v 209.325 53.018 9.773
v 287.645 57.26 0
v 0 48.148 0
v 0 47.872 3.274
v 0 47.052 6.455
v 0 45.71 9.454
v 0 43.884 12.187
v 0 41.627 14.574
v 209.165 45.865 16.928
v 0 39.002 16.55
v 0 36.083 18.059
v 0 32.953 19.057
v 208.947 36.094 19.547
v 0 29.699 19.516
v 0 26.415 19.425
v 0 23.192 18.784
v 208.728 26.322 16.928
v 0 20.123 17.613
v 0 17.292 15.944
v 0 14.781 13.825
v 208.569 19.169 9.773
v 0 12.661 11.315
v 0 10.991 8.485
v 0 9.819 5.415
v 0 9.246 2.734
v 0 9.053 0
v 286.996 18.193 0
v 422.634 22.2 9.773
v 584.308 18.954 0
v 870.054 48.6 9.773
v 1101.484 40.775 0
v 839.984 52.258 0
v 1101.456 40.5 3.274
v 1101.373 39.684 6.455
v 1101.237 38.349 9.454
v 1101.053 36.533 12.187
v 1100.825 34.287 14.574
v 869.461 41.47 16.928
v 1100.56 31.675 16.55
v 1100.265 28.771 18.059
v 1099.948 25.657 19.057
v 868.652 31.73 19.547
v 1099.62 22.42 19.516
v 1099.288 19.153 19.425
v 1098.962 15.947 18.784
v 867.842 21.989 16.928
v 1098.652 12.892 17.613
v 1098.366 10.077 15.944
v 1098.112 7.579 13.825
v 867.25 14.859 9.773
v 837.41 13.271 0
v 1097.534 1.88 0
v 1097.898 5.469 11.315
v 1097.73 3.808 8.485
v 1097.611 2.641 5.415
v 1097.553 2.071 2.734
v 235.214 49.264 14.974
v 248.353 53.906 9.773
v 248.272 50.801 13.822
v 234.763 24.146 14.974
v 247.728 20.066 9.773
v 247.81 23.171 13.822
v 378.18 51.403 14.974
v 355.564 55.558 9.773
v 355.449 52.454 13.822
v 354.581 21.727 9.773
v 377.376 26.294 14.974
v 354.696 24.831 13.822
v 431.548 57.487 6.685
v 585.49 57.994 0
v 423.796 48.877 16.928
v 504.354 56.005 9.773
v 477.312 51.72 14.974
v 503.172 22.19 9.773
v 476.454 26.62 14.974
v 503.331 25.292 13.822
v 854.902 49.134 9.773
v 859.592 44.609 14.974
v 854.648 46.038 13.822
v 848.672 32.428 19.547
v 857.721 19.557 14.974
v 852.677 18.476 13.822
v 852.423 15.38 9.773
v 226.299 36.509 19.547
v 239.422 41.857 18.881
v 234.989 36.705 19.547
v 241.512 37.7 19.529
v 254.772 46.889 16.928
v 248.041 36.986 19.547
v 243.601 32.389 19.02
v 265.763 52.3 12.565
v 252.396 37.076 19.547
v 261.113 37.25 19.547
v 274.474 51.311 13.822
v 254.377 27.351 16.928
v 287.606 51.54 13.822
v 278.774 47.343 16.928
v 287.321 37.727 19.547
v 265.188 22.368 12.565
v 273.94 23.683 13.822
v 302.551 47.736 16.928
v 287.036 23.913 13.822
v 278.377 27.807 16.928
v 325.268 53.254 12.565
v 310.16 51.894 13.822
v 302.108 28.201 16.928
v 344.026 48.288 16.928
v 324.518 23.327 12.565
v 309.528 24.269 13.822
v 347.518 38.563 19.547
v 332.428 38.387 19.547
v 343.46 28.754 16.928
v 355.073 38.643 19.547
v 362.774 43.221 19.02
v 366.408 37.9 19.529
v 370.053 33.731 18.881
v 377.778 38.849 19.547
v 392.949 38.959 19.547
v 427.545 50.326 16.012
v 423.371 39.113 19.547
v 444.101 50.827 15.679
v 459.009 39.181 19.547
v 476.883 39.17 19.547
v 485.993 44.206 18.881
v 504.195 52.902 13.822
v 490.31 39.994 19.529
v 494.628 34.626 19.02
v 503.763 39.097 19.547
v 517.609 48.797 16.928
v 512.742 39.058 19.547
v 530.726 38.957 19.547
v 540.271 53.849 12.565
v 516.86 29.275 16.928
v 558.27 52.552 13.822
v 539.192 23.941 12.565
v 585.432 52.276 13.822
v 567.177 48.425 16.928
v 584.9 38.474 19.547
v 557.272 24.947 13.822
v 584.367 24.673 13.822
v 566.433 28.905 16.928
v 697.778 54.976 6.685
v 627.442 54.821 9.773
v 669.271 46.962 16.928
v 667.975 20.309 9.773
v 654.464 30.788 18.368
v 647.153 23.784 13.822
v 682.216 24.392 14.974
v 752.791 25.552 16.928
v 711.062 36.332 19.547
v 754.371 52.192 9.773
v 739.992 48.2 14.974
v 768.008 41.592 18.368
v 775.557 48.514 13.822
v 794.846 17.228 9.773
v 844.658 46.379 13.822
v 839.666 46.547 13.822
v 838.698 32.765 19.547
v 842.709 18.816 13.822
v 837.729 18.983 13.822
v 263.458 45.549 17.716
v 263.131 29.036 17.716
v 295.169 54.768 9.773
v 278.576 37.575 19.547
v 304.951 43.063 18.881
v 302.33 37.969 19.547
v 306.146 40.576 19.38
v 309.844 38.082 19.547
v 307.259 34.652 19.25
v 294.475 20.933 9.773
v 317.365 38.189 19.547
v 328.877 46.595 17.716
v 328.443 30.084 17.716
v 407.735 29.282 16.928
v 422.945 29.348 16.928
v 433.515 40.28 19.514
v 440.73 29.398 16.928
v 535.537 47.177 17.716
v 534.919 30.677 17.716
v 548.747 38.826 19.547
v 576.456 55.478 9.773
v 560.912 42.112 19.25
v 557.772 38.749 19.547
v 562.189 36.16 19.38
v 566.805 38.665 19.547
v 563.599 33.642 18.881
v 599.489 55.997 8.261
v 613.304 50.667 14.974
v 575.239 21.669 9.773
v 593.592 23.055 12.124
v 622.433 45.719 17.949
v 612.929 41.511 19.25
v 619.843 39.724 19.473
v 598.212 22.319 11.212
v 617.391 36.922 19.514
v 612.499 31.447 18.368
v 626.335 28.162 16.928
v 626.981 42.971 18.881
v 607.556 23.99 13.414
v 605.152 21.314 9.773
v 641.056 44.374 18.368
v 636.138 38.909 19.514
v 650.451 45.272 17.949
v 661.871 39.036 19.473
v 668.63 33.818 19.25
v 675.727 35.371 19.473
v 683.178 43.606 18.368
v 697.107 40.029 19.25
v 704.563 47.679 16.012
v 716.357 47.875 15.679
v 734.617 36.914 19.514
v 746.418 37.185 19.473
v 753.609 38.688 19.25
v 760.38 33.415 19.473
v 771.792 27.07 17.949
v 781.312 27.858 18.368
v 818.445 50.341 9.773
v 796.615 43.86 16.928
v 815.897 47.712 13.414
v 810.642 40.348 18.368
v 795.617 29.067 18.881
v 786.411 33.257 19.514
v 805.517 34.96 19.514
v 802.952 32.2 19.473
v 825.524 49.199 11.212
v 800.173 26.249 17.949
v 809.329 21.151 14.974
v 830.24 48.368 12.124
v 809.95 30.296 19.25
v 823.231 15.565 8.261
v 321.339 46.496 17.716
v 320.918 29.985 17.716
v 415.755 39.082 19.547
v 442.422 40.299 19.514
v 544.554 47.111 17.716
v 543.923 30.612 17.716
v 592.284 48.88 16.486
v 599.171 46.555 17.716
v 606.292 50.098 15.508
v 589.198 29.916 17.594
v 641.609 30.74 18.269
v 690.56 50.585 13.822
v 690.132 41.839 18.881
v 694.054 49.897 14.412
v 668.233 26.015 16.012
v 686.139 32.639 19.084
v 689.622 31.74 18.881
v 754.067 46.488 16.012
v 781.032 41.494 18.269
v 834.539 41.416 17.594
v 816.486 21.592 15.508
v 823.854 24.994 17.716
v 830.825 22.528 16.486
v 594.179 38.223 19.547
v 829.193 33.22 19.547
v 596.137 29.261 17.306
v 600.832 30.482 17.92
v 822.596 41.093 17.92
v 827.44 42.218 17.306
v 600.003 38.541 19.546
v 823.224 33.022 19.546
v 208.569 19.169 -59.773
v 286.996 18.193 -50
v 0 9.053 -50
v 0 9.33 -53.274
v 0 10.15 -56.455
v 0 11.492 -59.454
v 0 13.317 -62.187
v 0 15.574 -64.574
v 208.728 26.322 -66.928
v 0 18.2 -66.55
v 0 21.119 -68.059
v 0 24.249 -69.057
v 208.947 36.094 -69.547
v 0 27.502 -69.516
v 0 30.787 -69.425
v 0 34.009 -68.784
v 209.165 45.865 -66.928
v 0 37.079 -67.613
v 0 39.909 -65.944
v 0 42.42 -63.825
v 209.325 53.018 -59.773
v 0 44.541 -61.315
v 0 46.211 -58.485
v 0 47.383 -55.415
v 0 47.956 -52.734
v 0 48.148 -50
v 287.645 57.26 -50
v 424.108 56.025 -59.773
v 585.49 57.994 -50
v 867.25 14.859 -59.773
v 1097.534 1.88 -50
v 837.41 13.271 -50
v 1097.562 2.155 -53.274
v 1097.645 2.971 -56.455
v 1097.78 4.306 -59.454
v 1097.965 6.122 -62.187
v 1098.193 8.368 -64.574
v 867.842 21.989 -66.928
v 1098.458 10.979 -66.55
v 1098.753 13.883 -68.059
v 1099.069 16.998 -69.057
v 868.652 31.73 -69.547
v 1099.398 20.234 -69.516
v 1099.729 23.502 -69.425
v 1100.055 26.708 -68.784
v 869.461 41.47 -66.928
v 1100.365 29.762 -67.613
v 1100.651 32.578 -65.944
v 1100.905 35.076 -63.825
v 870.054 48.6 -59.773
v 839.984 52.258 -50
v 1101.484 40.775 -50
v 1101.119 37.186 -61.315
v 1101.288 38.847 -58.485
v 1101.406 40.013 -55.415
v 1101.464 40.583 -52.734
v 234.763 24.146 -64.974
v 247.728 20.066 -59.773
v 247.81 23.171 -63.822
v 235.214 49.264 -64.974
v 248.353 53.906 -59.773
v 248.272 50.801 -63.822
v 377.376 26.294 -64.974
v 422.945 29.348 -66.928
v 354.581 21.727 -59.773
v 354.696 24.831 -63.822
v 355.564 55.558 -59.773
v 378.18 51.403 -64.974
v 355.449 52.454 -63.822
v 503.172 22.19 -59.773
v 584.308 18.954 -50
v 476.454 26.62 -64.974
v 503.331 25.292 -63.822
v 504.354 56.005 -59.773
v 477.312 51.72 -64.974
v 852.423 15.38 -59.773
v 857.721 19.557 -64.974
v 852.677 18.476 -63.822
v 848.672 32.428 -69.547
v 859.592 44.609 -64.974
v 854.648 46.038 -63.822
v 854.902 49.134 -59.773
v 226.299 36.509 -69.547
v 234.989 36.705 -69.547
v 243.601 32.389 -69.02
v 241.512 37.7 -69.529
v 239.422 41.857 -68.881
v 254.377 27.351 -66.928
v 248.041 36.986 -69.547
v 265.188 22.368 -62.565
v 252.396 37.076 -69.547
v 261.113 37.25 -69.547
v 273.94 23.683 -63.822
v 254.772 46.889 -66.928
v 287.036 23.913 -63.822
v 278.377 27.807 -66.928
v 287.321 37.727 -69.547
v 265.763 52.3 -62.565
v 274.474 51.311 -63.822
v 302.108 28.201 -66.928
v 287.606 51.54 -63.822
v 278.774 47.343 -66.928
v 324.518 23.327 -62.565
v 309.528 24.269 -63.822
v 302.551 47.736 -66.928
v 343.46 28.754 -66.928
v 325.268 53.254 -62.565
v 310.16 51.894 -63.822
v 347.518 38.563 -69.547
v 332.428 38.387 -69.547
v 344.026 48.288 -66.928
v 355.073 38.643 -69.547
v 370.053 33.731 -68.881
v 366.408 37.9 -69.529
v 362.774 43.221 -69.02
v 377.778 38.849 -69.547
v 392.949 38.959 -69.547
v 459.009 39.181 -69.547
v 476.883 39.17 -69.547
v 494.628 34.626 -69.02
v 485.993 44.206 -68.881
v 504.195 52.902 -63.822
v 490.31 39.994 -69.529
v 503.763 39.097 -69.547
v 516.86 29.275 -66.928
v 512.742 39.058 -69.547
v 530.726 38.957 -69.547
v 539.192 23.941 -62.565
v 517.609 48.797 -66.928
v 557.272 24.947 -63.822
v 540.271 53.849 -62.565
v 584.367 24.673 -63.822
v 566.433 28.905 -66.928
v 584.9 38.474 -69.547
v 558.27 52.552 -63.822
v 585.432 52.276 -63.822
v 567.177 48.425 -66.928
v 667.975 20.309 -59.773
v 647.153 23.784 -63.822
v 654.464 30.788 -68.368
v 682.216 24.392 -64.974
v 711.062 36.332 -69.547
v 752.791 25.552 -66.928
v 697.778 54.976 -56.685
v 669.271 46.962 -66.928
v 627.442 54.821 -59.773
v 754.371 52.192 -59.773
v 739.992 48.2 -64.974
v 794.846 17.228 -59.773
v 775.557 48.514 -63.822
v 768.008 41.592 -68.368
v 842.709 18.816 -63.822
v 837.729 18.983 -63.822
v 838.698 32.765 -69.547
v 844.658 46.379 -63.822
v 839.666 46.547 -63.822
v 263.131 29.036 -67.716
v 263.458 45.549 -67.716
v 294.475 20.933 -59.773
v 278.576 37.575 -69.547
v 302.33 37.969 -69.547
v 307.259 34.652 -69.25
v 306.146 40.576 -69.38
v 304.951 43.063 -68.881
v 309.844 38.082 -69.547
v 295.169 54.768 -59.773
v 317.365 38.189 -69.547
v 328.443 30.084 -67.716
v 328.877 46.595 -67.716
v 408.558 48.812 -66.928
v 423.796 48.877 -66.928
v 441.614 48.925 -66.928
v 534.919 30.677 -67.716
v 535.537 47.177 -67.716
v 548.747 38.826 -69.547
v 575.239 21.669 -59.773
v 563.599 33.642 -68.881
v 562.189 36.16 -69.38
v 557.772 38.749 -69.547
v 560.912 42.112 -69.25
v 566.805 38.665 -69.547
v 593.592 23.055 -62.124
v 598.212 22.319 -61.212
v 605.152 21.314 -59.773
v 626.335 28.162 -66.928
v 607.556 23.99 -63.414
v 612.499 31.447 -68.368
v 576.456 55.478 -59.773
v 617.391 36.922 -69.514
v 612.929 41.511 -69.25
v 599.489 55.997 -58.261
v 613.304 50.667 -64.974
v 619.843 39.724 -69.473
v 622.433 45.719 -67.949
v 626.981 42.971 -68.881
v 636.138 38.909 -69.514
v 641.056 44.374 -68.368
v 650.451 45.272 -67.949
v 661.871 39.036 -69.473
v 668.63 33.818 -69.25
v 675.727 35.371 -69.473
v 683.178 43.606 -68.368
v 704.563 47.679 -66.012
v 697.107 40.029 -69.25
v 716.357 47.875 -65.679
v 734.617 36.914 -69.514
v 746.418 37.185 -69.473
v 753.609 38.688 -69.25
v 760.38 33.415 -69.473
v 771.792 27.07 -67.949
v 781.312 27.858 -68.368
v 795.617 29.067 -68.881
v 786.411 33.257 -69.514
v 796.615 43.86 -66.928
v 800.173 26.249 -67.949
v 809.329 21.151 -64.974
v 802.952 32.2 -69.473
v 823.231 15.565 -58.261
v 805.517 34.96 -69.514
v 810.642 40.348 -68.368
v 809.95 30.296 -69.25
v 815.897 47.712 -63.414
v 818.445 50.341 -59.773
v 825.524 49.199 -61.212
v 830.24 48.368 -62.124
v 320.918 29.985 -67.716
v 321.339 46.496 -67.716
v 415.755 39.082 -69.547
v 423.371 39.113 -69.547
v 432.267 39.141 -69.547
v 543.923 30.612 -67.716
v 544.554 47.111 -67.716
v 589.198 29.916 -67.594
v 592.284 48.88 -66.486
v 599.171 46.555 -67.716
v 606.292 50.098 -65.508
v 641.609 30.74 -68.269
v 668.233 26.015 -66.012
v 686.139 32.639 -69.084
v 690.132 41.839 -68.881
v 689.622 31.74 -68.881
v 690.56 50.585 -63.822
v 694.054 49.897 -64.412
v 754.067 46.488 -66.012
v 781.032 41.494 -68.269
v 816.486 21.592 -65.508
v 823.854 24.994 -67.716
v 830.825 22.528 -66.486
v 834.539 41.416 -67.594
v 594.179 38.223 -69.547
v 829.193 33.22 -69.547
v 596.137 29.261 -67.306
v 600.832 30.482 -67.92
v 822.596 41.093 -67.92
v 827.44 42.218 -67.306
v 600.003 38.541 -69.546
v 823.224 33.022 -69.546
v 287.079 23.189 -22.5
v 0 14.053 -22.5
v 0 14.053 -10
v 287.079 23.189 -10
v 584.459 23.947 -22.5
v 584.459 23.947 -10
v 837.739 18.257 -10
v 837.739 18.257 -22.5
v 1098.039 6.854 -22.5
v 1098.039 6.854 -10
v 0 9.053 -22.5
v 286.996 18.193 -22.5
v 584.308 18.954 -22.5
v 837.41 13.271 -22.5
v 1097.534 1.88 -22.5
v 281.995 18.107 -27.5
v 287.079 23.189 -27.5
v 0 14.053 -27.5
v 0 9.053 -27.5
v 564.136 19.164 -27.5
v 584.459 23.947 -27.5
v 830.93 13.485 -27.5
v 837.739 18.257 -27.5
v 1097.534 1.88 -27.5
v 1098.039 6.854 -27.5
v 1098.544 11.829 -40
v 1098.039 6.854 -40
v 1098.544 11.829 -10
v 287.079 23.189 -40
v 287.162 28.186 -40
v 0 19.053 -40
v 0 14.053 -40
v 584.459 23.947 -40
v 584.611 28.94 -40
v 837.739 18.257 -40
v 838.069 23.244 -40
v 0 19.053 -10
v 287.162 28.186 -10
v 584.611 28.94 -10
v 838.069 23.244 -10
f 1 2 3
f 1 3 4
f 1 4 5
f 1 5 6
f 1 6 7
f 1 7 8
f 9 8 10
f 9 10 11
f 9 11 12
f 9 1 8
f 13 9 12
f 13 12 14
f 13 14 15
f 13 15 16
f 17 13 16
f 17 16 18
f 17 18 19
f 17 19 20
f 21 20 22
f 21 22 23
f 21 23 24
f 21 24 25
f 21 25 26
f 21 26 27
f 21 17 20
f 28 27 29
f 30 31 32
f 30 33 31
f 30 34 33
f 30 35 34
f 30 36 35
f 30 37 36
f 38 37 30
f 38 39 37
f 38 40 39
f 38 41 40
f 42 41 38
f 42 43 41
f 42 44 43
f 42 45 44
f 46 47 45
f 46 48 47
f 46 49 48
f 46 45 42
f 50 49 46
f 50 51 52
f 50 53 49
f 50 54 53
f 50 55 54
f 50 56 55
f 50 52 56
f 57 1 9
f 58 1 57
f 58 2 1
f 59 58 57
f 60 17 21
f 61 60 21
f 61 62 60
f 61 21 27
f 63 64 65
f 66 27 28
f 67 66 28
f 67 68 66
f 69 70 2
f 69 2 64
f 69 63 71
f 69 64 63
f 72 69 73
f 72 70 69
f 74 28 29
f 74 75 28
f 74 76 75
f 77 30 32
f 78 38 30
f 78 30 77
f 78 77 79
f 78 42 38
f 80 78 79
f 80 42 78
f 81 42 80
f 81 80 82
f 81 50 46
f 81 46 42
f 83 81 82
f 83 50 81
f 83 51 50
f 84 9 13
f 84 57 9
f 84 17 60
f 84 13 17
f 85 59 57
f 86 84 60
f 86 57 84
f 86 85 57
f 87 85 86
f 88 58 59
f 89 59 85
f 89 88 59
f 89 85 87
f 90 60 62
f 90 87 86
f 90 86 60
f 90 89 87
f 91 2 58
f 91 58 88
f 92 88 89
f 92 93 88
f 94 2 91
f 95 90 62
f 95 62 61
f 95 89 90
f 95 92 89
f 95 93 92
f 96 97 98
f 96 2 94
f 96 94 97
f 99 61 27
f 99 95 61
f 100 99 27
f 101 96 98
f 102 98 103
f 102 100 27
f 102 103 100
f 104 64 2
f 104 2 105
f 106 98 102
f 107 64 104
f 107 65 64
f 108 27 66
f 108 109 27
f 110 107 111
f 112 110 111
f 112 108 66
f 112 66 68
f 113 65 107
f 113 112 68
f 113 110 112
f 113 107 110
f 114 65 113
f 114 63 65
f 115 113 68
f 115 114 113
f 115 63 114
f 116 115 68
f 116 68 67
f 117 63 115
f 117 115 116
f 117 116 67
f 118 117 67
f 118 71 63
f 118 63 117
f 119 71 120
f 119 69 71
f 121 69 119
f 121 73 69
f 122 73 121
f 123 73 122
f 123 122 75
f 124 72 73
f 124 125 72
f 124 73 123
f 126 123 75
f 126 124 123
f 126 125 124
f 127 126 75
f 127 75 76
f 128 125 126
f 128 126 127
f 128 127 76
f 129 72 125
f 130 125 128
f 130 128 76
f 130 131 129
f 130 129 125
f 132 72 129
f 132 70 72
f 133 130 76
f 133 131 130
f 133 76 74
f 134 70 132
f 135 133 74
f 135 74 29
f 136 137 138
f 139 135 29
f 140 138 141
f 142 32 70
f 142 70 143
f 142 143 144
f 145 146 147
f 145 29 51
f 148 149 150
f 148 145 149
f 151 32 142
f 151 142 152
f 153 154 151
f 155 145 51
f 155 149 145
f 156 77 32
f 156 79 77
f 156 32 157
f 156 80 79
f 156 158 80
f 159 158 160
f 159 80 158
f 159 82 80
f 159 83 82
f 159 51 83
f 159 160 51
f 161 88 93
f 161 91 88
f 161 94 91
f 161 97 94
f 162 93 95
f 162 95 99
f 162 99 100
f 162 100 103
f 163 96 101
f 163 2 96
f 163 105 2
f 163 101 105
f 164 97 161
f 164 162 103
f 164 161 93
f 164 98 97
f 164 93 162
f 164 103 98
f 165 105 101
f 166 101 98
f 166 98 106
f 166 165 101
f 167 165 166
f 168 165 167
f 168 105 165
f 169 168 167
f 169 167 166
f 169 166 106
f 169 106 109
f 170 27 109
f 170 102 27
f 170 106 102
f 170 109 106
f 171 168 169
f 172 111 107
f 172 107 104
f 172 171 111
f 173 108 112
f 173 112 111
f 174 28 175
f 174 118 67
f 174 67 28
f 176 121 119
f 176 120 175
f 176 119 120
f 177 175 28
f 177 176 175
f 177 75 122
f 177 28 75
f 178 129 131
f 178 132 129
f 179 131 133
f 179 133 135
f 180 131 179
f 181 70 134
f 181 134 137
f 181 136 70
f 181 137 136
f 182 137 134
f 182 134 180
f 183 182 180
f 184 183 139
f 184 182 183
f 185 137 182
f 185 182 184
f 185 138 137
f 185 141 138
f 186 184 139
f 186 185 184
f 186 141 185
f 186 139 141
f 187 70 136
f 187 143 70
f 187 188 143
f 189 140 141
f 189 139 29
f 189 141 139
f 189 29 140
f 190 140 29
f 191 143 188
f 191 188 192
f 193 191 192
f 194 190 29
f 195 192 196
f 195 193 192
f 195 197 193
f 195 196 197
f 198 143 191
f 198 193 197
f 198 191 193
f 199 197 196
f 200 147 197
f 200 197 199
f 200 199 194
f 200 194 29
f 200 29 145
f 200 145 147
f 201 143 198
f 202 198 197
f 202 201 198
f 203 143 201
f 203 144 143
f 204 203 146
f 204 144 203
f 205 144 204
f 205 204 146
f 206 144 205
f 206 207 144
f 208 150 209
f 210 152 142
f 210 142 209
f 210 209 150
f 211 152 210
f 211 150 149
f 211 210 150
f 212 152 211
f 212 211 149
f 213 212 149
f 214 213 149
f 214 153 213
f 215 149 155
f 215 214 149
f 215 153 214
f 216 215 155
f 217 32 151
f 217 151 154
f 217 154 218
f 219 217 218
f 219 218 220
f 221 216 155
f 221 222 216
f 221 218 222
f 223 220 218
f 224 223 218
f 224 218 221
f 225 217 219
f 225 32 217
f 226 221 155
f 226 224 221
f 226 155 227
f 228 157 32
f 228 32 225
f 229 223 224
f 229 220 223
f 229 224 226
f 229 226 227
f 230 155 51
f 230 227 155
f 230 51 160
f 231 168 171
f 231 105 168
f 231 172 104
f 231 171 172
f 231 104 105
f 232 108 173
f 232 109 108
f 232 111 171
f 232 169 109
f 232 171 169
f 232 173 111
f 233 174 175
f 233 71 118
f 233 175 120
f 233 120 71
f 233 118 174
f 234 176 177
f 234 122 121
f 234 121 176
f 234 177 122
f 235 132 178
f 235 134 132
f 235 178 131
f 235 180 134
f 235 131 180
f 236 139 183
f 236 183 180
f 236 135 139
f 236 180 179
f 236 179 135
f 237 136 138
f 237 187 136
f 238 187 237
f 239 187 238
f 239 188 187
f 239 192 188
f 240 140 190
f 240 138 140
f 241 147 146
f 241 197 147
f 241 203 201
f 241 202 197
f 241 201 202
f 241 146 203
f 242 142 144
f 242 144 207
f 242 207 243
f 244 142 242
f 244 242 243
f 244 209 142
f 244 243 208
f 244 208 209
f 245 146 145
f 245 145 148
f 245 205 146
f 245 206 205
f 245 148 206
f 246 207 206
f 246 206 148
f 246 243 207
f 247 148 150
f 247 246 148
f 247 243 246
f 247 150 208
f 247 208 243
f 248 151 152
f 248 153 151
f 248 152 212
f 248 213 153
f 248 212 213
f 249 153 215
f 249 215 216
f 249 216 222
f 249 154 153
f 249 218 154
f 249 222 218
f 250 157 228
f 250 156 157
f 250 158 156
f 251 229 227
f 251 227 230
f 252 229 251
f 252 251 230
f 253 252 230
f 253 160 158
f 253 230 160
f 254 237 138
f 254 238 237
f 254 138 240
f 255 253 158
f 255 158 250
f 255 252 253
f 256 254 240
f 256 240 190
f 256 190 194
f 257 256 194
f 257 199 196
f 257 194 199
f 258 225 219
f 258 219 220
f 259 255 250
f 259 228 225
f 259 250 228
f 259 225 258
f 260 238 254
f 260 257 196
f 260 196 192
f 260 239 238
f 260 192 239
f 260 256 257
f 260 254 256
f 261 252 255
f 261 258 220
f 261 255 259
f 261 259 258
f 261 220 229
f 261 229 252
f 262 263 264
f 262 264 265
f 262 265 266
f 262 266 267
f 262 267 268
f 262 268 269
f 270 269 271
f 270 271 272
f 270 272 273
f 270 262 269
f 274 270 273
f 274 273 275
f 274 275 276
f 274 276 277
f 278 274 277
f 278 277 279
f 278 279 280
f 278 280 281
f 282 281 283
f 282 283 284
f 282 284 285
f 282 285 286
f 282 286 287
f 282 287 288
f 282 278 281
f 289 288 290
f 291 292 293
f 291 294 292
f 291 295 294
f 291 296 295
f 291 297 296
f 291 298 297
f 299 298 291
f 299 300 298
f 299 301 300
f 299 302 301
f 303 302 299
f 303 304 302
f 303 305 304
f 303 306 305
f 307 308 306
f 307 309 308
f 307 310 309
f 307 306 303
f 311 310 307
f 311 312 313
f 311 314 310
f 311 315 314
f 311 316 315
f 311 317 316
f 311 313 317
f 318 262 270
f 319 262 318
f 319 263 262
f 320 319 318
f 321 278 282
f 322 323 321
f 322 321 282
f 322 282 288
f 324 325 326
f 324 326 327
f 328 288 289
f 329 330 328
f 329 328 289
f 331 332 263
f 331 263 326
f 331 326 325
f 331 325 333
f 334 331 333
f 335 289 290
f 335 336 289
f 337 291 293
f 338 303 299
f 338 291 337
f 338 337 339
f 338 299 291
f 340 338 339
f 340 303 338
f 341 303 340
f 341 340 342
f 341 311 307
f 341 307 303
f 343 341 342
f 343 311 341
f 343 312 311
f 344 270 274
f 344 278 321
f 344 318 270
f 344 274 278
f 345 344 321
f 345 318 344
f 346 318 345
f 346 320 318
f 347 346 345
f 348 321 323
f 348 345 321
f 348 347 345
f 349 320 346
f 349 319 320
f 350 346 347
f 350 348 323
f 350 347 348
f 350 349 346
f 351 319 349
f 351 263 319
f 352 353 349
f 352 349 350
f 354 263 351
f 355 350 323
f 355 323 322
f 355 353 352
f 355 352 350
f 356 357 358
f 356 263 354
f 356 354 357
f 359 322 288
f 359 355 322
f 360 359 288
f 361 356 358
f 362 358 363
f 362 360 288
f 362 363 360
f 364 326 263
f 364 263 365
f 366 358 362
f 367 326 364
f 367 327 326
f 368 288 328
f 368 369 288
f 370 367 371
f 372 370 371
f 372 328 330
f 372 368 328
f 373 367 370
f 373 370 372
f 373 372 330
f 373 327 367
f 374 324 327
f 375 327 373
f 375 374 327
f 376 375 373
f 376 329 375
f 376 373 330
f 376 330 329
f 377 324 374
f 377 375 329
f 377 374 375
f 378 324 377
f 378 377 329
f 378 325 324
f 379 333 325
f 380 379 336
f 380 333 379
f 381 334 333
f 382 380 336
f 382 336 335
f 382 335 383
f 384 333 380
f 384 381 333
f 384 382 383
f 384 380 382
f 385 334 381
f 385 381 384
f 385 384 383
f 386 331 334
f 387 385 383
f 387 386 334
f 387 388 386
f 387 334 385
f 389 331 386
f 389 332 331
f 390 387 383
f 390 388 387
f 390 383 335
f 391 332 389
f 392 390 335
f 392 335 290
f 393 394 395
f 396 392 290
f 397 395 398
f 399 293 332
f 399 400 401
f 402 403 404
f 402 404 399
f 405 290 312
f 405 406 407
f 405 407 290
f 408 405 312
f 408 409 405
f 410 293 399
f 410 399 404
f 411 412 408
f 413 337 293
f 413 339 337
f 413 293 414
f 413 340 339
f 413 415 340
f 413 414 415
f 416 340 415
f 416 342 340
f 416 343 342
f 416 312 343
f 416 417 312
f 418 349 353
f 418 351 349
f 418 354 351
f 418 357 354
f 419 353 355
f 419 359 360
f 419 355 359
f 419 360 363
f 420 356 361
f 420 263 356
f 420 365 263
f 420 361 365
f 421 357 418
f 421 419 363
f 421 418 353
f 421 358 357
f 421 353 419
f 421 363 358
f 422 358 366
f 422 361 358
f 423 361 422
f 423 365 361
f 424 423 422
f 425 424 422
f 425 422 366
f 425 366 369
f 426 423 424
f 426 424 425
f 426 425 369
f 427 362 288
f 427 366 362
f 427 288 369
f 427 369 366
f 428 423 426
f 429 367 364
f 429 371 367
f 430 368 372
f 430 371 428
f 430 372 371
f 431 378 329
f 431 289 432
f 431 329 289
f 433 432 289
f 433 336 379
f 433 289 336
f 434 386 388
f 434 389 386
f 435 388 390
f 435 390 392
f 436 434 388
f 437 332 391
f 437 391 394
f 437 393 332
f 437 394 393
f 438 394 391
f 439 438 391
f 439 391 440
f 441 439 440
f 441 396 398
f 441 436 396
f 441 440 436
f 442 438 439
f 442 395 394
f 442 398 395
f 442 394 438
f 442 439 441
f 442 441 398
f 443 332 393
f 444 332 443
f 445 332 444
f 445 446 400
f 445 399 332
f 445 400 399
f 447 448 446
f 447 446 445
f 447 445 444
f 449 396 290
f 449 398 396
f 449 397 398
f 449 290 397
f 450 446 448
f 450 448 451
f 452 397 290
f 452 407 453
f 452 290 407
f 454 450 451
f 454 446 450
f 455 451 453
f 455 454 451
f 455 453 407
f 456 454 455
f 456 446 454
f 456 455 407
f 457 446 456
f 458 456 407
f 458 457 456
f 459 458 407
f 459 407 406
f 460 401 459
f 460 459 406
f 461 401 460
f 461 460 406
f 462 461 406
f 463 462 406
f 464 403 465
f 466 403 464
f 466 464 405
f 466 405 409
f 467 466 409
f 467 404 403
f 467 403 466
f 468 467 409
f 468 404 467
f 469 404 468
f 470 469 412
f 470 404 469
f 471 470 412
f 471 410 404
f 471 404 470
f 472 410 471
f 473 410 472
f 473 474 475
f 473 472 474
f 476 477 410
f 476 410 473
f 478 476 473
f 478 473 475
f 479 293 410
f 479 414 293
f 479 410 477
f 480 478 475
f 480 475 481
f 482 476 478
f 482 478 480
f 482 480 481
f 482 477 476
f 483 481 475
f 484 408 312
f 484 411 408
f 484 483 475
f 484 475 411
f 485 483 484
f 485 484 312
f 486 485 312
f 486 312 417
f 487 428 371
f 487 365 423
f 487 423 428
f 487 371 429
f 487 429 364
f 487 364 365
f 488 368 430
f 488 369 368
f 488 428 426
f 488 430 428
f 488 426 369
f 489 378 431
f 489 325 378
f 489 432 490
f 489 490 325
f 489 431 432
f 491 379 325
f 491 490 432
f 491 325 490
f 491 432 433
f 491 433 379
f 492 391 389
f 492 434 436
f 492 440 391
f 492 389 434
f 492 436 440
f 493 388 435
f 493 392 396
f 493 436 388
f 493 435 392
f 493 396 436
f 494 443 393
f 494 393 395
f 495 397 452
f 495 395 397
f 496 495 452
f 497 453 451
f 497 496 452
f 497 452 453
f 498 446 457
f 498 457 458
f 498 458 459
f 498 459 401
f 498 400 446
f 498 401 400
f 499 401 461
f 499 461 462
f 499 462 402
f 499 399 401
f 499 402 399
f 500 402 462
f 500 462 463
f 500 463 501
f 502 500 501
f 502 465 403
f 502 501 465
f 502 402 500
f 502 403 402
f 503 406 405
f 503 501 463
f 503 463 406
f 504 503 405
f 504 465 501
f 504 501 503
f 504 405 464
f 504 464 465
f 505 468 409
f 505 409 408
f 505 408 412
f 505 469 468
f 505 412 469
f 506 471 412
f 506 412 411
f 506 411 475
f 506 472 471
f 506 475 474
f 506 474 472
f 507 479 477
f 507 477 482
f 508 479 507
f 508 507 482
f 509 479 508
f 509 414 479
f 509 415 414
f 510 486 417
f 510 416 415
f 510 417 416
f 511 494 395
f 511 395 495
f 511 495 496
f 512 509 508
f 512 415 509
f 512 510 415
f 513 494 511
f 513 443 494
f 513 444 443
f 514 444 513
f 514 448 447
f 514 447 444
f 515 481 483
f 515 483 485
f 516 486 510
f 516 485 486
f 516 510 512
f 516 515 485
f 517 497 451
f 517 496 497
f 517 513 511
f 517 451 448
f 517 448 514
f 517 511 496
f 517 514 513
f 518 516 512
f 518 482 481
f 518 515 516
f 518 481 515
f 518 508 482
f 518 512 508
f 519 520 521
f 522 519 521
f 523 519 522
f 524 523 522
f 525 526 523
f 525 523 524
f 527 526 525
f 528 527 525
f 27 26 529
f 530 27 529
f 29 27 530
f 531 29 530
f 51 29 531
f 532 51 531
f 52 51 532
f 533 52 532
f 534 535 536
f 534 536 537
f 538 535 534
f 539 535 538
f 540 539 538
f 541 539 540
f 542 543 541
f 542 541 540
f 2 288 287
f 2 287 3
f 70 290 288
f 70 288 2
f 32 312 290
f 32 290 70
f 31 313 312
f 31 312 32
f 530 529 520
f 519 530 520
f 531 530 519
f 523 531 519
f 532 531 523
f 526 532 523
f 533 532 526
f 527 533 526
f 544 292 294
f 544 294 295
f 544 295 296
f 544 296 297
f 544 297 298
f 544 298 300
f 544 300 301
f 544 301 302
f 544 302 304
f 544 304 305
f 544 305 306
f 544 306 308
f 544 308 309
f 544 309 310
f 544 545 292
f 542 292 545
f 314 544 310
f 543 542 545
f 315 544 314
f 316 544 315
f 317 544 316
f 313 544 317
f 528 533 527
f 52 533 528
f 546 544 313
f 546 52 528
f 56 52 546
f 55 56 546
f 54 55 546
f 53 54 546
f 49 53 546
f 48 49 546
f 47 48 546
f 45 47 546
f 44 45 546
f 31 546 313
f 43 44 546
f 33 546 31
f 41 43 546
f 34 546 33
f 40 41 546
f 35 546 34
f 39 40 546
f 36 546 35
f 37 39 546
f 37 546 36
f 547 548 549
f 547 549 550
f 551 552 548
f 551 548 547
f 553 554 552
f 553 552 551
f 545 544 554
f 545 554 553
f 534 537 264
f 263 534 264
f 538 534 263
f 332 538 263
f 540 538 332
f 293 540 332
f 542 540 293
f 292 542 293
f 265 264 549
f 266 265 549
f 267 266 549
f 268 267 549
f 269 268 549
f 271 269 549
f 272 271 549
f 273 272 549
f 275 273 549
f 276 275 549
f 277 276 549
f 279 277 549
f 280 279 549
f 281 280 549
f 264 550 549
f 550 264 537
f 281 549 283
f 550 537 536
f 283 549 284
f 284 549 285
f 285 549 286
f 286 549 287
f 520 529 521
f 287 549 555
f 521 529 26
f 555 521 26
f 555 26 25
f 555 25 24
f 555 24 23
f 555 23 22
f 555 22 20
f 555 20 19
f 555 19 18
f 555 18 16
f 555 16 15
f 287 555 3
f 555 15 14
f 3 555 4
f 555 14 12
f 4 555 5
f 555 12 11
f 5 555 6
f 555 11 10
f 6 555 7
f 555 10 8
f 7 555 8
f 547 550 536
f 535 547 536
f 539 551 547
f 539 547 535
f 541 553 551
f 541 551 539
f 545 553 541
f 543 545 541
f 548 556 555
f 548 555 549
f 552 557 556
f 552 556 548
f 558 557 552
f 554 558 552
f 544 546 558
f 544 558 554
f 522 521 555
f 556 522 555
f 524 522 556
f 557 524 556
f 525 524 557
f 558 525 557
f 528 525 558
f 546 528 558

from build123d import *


with BuildPart() as part:
    # Sweep1: sweep along a curve in space
    with BuildLine() as sweep1_path:
        add(Edge.make_bspline(
            [(0, 28.600823045, -25), (515.519545798, 52.9249772, -25), (1099.508665119, 21.327347601, -25)],
            knots=[0, 0, 0, 1, 1, 1], degree=2))
    # Sketch2 → Sweep1 (sweep)
    with BuildSketch(Plane(origin=(0, 0, 0), x_dir=(0, 0, -1), z_dir=(1, 0, 0))):
        with BuildLine():
            Line((0, 48.148148148), (50, 48.148148148))
            ThreePointArc((50, 48.148148148), (69.547325103, 28.600823045), (50, 9.053497942))
            Line((50, 9.053497942), (0, 9.053497942))
            ThreePointArc((0, 9.053497942), (-19.547325103, 28.600823045), (0, 48.148148148))
        make_face()
    sweep(path=sweep1_path.line)

    # Cut-Sweep1: sweep along a curve in space
    with BuildLine() as cut_sweep1_path:
        add(Edge.make_bspline(
            [(0, 28.600823045, -25), (515.519545798, 52.9249772, -25), (1099.508665119, 21.327347601, -25)],
            knots=[0, 0, 0, 1, 1, 1], degree=2))
    # Sketch3 → Cut-Sweep1 (sweep, cut)
    with BuildSketch(Plane.ZY):
        Polygon((-40, 19.053497942), (-10, 19.053497942), (-10, 14.053497942), (-22.5, 14.053497942), (-22.5, 9.053497942), (-22.174756388, 5.22639824), (-27.5, 5.22639824), (-27.5, 9.053497942), (-27.5, 14.053497942), (-40, 14.053497942), align=None)
    sweep(path=cut_sweep1_path.line, mode=Mode.SUBTRACT)


solid = part.part
